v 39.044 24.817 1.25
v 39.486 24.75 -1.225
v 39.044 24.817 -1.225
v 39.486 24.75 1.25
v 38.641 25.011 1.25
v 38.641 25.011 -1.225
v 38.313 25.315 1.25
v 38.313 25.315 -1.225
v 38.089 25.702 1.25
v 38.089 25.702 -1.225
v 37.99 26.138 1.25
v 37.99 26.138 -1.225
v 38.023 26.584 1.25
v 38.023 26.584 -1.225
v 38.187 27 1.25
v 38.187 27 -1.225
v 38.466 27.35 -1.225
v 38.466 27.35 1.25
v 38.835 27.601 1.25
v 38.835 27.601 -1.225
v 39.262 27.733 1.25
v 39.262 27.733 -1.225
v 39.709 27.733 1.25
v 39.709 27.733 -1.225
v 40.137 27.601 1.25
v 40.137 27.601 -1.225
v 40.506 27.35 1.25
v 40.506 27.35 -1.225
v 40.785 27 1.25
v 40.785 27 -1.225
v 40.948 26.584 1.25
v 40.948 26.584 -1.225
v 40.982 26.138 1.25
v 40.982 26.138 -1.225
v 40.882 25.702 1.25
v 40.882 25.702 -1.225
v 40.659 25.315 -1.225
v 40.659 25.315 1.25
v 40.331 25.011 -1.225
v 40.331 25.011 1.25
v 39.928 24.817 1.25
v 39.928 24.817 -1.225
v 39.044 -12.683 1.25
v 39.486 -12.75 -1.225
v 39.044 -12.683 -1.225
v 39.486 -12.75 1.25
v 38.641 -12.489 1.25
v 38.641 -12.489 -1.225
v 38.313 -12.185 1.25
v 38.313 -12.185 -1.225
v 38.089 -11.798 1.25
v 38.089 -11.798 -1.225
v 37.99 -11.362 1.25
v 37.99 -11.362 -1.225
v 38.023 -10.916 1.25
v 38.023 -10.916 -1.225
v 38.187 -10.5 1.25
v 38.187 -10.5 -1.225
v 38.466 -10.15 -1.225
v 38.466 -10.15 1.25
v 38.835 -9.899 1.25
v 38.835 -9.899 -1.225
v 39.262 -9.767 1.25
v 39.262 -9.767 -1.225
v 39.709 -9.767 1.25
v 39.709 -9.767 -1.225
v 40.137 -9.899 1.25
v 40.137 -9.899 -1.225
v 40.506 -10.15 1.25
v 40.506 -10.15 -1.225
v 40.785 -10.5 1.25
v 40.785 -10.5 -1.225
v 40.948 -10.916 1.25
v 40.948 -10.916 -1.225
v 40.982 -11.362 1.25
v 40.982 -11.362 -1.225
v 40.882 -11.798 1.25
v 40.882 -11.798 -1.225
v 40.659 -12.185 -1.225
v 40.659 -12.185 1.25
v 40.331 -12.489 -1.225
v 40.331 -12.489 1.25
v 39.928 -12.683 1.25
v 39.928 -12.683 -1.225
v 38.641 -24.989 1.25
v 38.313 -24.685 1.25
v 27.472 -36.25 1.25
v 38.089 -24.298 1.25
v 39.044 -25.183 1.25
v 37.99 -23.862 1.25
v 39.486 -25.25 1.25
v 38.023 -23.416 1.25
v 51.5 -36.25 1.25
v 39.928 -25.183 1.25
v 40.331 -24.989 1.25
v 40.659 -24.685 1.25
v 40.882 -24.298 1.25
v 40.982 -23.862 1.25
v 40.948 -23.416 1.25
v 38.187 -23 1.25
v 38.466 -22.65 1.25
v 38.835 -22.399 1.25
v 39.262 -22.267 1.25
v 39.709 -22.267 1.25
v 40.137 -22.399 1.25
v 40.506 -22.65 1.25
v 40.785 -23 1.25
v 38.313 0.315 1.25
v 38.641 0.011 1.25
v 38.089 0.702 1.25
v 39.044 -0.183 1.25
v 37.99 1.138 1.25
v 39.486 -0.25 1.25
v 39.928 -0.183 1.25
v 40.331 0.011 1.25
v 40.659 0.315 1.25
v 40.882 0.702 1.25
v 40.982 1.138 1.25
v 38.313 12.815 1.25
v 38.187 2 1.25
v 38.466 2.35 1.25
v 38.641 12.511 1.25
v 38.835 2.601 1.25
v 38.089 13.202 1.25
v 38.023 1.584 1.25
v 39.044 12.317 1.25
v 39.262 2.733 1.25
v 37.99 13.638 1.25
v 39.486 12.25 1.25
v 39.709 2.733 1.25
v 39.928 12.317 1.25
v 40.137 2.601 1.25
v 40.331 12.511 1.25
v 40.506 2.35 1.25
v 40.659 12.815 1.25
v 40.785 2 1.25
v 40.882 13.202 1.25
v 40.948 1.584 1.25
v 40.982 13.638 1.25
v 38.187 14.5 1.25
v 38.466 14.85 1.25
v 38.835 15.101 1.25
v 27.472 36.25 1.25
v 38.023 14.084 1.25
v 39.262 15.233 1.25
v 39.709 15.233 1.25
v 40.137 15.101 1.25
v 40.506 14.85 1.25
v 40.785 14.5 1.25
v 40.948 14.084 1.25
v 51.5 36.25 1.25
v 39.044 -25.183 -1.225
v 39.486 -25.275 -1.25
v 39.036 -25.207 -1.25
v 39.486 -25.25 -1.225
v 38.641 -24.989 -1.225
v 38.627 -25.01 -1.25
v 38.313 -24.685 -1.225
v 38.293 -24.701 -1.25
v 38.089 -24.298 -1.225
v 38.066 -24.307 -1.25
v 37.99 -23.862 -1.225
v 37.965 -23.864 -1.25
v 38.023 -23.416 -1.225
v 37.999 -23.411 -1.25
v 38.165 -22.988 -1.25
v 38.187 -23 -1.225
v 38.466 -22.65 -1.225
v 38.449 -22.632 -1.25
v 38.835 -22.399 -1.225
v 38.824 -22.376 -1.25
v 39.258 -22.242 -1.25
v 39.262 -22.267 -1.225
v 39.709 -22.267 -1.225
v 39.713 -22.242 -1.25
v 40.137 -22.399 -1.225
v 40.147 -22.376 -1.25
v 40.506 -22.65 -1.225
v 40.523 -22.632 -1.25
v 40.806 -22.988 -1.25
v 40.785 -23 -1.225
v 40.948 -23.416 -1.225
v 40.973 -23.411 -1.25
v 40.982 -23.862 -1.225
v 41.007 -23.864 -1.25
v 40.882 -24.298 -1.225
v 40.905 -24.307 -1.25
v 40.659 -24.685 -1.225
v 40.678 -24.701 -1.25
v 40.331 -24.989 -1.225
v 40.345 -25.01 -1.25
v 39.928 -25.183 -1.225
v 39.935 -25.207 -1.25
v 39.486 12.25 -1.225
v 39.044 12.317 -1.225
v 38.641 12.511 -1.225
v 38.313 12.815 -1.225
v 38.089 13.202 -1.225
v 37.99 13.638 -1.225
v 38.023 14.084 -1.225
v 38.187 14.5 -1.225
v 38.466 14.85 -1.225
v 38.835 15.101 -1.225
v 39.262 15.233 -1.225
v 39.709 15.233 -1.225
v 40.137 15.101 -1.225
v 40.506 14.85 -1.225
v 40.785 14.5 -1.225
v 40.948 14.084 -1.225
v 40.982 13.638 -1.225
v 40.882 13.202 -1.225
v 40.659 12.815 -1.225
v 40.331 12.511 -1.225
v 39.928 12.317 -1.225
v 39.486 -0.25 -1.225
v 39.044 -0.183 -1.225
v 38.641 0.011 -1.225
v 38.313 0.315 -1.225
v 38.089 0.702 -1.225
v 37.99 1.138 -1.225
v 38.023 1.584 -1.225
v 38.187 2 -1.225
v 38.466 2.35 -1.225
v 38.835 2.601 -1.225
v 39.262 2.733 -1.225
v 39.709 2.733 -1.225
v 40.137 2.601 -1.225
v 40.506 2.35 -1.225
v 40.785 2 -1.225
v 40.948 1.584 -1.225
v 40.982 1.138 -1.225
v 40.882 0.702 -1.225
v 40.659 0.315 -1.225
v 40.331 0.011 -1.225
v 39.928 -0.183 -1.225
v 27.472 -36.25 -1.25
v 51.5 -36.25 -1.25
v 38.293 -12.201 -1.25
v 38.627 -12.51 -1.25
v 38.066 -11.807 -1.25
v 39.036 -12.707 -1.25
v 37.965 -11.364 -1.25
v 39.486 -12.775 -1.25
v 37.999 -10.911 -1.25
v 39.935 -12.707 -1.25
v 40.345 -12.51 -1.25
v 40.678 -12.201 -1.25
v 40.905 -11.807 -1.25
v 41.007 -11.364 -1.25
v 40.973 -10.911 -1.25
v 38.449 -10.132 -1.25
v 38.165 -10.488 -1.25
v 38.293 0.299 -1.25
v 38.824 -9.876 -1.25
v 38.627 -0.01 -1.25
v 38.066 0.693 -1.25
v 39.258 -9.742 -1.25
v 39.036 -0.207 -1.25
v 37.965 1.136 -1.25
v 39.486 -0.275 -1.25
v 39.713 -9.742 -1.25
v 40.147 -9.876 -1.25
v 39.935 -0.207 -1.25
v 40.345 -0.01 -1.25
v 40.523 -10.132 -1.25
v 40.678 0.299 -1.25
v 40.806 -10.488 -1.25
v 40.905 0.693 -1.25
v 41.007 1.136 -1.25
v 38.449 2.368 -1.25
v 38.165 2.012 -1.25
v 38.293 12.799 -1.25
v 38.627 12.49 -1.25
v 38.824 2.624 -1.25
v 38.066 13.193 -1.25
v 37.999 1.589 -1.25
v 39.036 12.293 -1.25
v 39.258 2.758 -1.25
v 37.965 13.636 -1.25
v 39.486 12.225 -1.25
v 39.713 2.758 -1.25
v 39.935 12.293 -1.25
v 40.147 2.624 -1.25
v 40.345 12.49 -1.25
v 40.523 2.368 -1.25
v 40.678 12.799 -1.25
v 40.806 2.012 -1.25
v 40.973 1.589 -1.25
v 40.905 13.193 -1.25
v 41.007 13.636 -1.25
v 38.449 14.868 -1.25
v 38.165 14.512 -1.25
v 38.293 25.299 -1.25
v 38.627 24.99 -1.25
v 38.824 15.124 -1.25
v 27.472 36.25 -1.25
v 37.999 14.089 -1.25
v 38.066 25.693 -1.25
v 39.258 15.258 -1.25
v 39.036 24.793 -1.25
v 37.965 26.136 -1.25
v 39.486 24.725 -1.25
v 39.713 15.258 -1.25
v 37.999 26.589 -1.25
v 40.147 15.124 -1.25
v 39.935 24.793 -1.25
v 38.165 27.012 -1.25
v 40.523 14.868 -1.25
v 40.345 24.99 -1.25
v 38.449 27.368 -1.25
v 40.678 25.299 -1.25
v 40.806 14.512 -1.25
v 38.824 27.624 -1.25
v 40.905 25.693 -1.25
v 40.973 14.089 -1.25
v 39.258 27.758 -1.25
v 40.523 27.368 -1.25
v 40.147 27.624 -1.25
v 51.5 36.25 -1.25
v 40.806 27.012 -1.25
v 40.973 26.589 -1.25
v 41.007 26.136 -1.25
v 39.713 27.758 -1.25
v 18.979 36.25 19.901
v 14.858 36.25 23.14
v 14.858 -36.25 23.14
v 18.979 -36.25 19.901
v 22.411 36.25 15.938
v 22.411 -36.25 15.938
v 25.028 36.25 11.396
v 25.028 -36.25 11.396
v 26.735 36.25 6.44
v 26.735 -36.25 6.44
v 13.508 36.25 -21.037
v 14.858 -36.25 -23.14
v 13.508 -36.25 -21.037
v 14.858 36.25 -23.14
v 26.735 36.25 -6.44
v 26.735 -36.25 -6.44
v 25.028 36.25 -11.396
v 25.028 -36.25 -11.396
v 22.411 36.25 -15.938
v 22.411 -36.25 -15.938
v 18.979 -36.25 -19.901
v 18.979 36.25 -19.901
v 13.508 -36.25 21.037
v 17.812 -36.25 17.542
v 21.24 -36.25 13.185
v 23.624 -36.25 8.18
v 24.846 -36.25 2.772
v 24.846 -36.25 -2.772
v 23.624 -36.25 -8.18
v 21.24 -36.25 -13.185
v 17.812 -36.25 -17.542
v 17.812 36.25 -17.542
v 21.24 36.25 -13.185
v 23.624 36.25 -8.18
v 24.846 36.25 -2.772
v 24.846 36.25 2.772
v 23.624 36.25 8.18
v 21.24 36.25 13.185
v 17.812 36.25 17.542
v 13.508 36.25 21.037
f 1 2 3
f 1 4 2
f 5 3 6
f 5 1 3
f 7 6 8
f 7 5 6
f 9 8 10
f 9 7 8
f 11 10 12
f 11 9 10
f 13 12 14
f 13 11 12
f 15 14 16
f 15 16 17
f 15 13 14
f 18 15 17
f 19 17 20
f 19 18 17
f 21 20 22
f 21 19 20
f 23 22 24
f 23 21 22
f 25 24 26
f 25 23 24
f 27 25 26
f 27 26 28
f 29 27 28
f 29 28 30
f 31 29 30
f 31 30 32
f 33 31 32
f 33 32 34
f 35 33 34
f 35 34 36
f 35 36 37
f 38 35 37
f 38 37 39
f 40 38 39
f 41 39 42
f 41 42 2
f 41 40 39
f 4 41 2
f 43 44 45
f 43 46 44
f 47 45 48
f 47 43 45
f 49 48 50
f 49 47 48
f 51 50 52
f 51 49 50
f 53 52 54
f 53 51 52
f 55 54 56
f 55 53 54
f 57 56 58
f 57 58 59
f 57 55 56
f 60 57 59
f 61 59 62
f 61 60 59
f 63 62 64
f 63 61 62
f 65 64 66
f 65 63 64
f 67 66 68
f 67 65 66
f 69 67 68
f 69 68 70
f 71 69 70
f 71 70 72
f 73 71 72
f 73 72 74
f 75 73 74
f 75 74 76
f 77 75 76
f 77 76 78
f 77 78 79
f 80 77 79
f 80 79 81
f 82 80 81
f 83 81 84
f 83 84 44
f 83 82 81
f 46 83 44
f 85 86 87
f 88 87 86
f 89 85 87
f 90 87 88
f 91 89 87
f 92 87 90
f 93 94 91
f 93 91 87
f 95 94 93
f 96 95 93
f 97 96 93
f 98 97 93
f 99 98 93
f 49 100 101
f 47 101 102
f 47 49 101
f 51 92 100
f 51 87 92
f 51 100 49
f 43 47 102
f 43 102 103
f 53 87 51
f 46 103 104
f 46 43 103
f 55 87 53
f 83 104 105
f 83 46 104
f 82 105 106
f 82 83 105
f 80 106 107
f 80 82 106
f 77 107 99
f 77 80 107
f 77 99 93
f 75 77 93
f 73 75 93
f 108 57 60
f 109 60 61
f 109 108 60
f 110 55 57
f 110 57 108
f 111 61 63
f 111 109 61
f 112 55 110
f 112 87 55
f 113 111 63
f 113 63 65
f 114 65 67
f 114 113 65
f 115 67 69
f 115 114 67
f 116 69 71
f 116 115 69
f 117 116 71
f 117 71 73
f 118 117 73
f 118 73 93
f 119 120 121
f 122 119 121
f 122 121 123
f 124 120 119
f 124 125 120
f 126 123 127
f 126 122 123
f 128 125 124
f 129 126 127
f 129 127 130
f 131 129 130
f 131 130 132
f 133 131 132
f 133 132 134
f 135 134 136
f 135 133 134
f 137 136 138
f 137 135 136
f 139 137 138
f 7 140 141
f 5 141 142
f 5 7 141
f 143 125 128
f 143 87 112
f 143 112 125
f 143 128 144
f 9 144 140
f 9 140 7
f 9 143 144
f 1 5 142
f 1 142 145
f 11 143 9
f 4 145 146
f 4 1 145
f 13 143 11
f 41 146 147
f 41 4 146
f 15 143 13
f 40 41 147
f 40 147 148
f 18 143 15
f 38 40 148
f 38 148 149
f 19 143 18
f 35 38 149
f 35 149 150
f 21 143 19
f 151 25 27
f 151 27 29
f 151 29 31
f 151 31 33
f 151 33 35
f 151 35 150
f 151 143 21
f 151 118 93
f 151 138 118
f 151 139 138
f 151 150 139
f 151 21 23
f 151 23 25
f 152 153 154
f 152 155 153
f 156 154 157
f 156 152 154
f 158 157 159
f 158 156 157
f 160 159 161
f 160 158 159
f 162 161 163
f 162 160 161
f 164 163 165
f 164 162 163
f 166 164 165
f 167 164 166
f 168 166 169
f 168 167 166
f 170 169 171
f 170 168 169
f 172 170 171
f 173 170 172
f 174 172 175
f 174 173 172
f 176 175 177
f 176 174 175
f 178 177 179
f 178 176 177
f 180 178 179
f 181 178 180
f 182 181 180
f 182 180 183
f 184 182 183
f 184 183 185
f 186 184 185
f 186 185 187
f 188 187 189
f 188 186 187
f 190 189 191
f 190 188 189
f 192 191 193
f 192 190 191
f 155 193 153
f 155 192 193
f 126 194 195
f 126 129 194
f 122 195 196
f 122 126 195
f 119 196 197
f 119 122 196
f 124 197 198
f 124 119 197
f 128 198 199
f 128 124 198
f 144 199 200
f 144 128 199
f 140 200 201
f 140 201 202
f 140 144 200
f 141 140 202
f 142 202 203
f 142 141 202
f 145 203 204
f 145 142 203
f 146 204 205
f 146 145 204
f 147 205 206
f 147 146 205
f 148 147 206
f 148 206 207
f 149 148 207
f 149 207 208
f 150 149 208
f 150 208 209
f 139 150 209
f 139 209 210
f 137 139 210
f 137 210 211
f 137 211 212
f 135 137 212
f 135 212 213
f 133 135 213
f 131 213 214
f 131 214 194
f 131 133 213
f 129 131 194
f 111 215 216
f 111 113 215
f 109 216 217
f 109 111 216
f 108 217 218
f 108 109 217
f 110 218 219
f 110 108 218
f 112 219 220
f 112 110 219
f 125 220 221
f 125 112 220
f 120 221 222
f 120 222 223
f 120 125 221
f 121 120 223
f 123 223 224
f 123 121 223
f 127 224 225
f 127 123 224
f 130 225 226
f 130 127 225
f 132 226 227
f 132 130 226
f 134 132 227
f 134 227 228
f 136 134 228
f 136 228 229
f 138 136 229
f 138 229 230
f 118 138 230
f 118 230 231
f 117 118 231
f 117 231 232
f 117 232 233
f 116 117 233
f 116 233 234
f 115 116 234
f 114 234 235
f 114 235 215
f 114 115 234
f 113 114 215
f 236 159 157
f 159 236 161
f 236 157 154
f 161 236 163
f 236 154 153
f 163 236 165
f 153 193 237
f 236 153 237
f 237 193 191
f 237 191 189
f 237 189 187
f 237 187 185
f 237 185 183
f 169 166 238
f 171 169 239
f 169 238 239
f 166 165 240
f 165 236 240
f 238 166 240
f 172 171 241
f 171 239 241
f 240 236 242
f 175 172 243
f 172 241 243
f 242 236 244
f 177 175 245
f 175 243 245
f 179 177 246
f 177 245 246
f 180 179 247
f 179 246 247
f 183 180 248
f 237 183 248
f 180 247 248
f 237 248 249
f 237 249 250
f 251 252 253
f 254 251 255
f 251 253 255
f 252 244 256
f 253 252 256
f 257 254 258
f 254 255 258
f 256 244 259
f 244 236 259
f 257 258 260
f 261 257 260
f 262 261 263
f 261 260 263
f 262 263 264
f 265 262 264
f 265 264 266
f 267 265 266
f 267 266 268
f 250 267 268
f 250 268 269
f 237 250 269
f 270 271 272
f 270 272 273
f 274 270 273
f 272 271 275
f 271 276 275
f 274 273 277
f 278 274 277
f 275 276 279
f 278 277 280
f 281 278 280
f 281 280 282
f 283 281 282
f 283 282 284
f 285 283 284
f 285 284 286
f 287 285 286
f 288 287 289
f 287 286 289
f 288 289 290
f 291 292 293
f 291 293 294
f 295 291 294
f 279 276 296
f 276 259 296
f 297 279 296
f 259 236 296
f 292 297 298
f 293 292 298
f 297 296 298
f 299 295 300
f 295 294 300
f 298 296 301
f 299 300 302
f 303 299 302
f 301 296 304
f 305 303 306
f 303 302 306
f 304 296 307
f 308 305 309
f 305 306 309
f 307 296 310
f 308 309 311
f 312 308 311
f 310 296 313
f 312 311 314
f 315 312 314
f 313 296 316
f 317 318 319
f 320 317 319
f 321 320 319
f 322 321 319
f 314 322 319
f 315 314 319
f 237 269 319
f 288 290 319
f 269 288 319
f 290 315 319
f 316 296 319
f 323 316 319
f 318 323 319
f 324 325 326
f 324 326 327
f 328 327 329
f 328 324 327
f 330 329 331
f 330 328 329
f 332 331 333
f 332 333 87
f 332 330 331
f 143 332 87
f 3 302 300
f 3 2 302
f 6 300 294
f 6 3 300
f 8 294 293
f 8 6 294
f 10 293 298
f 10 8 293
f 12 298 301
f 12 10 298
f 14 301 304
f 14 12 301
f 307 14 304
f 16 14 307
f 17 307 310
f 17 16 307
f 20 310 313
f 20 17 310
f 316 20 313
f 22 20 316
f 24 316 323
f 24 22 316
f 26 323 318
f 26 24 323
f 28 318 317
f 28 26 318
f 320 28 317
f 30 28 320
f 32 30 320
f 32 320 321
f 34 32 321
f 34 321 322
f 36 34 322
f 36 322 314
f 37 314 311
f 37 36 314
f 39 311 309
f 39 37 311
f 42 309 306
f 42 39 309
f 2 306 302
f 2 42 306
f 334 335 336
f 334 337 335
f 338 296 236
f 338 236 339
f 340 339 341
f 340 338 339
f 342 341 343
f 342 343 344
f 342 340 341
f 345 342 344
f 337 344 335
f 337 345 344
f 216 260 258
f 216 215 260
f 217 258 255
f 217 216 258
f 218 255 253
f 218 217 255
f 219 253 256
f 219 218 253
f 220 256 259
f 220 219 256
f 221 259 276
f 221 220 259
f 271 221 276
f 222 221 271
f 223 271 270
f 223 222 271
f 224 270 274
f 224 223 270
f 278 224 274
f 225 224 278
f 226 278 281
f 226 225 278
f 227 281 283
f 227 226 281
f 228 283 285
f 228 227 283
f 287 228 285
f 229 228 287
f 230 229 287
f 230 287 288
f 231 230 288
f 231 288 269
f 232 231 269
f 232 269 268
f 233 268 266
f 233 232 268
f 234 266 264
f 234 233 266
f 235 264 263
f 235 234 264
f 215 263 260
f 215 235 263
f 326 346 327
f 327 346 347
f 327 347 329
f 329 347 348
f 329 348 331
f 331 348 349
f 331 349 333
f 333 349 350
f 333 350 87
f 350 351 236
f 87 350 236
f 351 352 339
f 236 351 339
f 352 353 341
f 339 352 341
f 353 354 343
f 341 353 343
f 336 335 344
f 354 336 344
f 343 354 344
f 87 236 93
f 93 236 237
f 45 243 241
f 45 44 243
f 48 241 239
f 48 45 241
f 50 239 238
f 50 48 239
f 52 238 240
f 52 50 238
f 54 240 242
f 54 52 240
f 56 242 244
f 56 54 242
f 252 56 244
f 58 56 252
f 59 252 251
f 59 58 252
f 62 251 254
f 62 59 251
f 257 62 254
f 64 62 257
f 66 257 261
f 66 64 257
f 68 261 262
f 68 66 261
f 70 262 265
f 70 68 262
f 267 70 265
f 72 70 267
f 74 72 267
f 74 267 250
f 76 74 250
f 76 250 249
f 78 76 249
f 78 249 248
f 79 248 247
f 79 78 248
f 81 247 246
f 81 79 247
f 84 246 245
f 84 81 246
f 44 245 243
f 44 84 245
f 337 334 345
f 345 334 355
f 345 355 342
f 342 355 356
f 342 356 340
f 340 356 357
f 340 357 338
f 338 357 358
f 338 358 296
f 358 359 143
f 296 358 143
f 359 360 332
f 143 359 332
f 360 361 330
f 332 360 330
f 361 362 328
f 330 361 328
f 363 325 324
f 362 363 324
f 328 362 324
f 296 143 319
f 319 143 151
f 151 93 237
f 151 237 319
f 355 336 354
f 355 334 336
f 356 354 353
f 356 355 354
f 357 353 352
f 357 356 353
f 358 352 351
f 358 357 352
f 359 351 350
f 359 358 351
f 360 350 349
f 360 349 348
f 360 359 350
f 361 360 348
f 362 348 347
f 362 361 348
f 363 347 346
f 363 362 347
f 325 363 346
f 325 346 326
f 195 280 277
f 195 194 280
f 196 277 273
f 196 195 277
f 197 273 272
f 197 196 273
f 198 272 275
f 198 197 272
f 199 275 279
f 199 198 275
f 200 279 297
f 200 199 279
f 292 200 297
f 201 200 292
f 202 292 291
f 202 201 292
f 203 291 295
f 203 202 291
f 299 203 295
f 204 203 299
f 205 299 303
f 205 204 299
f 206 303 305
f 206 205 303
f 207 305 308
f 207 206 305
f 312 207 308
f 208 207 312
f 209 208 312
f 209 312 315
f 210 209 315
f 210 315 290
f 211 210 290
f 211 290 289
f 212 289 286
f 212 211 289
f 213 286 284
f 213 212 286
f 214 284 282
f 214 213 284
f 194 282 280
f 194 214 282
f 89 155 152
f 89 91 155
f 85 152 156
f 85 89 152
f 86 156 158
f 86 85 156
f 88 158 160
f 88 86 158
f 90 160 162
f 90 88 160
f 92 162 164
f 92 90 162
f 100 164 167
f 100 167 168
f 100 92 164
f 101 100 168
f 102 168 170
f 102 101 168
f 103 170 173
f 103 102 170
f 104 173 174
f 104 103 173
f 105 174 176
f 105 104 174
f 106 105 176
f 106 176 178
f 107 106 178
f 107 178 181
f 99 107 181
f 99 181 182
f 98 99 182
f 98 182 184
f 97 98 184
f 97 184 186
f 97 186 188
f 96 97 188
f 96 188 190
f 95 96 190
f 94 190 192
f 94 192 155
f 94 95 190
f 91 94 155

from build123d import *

# Parameters (mm, degrees)
EXTRUDE_THIN1_DEPTH = 36.25
SKETCH2_W           = 25
SKETCH2_H           = 72.5
BOSS_EXTRUDE1_DEPTH = 1.25
LPATTERN1_COUNT     = 5
LPATTERN1_PITCH     = 12.5


with BuildPart() as part:
    # Sketch1 → Extrude-Thin1 (new, symmetric)
    with BuildSketch(Plane(origin=(0, 0, 0), x_dir=(1, 0, 0), z_dir=(0, 1, 0))):
        with BuildLine():
            ThreePointArc((13.507557647, 21.03677462), (25, 0), (13.507557647, -21.03677462))
            Line((13.507557647, -21.03677462), (14.858313411, -23.140452082))
            ThreePointArc((14.858313411, -23.140452082), (27.5, 0), (14.858313411, 23.140452082))
            Line((14.858313411, 23.140452082), (13.507557647, 21.03677462))
        make_face()
    extrude(amount=EXTRUDE_THIN1_DEPTH, both=True)

    # Sketch2 → Boss-Extrude1 (add, symmetric)
    with BuildSketch(Plane.XY):
        with Locations((39, 0)):
            Rectangle(SKETCH2_W, SKETCH2_H)
    extrude(amount=BOSS_EXTRUDE1_DEPTH, both=True)

    # Sketch4 → Ø3.0mm Dowel Hole1 (revolve, cut)
    with BuildSketch(Plane(origin=(39.48578811, 26.25, 1.25), x_dir=(0, -1, 0), z_dir=(1, 0, 0))):
        Polygon((0, 0), (0, 2.5), (1.525, 2.5), (1.5, 2.475), (1.5, 0), align=None)
    f_3_0mm_dowel_hole1 = revolve(axis=Axis((39.48578811, 26.25, 7.6), (0, 0, -1)), mode=Mode.SUBTRACT)

    # LPattern1: Ø3.0mm Dowel Hole1 ×5
    with Locations(*[(0, -i * LPATTERN1_PITCH, 0) for i in range(1, LPATTERN1_COUNT)]):
        add(f_3_0mm_dowel_hole1, mode=Mode.SUBTRACT)


solid = part.part
